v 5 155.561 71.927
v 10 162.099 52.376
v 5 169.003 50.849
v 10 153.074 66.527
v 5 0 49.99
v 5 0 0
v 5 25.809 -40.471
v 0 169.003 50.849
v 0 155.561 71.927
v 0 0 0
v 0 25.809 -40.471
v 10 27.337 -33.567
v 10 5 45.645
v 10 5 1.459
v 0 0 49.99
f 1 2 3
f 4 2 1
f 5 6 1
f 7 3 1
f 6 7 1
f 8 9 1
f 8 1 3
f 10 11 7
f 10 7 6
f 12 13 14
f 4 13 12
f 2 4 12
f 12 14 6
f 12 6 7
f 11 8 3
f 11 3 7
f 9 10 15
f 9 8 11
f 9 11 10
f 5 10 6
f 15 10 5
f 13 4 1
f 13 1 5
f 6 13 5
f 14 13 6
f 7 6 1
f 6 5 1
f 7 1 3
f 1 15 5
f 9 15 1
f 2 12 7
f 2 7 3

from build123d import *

# Parameters (mm, degrees)
EXTRUDE_1_DEPTH = 5
EXTRUDE_2_DEPTH = 5
CHAMFER_1_SIZE  = 5


with BuildPart() as part:
    # 草图1 → 凸台-拉伸1 (new body)
    with BuildSketch(Plane(origin=(0, 0, 0), x_dir=(0, 0, -1), z_dir=(1, 0, 0))):
        Polygon((0, 0), (-49.989775554, 0), (-71.927055422, 155.560810463), (-50.848590899, 169.003218482), (40.470651885, 25.809423396), align=None)
    extrude(amount=EXTRUDE_1_DEPTH)


with BuildPart() as body_2:
    # 草图2 → 凸台-拉伸2 (new body)
    with BuildSketch(Plane(origin=(5, 0, 0), x_dir=(0, 0, -1), z_dir=(1, 0, 0))):
        Polygon((0, 0), (40.470651885, 25.809423396), (-50.848590899, 169.003218482), (-71.927055422, 155.560810463), (-49.989775554, 0), align=None)
    extrude(amount=EXTRUDE_2_DEPTH)

    # 倒角1
    chamfer_1_edges = [body_2.edges().sort_by_distance(p)[0] for p in [
        (10, 77.780405232, 60.958415488),
        (10, 162.282014473, 61.38782316),
        (10, 97.406320939, 5.188969507),
        (10, 12.904711698, -20.235325942),
        (10, 0, 24.994887777),
    ]]
    chamfer(chamfer_1_edges, length=CHAMFER_1_SIZE - 0.0001)  # a hair under: the kernel refuses the full size


solid = Compound([part.part, body_2.part])
